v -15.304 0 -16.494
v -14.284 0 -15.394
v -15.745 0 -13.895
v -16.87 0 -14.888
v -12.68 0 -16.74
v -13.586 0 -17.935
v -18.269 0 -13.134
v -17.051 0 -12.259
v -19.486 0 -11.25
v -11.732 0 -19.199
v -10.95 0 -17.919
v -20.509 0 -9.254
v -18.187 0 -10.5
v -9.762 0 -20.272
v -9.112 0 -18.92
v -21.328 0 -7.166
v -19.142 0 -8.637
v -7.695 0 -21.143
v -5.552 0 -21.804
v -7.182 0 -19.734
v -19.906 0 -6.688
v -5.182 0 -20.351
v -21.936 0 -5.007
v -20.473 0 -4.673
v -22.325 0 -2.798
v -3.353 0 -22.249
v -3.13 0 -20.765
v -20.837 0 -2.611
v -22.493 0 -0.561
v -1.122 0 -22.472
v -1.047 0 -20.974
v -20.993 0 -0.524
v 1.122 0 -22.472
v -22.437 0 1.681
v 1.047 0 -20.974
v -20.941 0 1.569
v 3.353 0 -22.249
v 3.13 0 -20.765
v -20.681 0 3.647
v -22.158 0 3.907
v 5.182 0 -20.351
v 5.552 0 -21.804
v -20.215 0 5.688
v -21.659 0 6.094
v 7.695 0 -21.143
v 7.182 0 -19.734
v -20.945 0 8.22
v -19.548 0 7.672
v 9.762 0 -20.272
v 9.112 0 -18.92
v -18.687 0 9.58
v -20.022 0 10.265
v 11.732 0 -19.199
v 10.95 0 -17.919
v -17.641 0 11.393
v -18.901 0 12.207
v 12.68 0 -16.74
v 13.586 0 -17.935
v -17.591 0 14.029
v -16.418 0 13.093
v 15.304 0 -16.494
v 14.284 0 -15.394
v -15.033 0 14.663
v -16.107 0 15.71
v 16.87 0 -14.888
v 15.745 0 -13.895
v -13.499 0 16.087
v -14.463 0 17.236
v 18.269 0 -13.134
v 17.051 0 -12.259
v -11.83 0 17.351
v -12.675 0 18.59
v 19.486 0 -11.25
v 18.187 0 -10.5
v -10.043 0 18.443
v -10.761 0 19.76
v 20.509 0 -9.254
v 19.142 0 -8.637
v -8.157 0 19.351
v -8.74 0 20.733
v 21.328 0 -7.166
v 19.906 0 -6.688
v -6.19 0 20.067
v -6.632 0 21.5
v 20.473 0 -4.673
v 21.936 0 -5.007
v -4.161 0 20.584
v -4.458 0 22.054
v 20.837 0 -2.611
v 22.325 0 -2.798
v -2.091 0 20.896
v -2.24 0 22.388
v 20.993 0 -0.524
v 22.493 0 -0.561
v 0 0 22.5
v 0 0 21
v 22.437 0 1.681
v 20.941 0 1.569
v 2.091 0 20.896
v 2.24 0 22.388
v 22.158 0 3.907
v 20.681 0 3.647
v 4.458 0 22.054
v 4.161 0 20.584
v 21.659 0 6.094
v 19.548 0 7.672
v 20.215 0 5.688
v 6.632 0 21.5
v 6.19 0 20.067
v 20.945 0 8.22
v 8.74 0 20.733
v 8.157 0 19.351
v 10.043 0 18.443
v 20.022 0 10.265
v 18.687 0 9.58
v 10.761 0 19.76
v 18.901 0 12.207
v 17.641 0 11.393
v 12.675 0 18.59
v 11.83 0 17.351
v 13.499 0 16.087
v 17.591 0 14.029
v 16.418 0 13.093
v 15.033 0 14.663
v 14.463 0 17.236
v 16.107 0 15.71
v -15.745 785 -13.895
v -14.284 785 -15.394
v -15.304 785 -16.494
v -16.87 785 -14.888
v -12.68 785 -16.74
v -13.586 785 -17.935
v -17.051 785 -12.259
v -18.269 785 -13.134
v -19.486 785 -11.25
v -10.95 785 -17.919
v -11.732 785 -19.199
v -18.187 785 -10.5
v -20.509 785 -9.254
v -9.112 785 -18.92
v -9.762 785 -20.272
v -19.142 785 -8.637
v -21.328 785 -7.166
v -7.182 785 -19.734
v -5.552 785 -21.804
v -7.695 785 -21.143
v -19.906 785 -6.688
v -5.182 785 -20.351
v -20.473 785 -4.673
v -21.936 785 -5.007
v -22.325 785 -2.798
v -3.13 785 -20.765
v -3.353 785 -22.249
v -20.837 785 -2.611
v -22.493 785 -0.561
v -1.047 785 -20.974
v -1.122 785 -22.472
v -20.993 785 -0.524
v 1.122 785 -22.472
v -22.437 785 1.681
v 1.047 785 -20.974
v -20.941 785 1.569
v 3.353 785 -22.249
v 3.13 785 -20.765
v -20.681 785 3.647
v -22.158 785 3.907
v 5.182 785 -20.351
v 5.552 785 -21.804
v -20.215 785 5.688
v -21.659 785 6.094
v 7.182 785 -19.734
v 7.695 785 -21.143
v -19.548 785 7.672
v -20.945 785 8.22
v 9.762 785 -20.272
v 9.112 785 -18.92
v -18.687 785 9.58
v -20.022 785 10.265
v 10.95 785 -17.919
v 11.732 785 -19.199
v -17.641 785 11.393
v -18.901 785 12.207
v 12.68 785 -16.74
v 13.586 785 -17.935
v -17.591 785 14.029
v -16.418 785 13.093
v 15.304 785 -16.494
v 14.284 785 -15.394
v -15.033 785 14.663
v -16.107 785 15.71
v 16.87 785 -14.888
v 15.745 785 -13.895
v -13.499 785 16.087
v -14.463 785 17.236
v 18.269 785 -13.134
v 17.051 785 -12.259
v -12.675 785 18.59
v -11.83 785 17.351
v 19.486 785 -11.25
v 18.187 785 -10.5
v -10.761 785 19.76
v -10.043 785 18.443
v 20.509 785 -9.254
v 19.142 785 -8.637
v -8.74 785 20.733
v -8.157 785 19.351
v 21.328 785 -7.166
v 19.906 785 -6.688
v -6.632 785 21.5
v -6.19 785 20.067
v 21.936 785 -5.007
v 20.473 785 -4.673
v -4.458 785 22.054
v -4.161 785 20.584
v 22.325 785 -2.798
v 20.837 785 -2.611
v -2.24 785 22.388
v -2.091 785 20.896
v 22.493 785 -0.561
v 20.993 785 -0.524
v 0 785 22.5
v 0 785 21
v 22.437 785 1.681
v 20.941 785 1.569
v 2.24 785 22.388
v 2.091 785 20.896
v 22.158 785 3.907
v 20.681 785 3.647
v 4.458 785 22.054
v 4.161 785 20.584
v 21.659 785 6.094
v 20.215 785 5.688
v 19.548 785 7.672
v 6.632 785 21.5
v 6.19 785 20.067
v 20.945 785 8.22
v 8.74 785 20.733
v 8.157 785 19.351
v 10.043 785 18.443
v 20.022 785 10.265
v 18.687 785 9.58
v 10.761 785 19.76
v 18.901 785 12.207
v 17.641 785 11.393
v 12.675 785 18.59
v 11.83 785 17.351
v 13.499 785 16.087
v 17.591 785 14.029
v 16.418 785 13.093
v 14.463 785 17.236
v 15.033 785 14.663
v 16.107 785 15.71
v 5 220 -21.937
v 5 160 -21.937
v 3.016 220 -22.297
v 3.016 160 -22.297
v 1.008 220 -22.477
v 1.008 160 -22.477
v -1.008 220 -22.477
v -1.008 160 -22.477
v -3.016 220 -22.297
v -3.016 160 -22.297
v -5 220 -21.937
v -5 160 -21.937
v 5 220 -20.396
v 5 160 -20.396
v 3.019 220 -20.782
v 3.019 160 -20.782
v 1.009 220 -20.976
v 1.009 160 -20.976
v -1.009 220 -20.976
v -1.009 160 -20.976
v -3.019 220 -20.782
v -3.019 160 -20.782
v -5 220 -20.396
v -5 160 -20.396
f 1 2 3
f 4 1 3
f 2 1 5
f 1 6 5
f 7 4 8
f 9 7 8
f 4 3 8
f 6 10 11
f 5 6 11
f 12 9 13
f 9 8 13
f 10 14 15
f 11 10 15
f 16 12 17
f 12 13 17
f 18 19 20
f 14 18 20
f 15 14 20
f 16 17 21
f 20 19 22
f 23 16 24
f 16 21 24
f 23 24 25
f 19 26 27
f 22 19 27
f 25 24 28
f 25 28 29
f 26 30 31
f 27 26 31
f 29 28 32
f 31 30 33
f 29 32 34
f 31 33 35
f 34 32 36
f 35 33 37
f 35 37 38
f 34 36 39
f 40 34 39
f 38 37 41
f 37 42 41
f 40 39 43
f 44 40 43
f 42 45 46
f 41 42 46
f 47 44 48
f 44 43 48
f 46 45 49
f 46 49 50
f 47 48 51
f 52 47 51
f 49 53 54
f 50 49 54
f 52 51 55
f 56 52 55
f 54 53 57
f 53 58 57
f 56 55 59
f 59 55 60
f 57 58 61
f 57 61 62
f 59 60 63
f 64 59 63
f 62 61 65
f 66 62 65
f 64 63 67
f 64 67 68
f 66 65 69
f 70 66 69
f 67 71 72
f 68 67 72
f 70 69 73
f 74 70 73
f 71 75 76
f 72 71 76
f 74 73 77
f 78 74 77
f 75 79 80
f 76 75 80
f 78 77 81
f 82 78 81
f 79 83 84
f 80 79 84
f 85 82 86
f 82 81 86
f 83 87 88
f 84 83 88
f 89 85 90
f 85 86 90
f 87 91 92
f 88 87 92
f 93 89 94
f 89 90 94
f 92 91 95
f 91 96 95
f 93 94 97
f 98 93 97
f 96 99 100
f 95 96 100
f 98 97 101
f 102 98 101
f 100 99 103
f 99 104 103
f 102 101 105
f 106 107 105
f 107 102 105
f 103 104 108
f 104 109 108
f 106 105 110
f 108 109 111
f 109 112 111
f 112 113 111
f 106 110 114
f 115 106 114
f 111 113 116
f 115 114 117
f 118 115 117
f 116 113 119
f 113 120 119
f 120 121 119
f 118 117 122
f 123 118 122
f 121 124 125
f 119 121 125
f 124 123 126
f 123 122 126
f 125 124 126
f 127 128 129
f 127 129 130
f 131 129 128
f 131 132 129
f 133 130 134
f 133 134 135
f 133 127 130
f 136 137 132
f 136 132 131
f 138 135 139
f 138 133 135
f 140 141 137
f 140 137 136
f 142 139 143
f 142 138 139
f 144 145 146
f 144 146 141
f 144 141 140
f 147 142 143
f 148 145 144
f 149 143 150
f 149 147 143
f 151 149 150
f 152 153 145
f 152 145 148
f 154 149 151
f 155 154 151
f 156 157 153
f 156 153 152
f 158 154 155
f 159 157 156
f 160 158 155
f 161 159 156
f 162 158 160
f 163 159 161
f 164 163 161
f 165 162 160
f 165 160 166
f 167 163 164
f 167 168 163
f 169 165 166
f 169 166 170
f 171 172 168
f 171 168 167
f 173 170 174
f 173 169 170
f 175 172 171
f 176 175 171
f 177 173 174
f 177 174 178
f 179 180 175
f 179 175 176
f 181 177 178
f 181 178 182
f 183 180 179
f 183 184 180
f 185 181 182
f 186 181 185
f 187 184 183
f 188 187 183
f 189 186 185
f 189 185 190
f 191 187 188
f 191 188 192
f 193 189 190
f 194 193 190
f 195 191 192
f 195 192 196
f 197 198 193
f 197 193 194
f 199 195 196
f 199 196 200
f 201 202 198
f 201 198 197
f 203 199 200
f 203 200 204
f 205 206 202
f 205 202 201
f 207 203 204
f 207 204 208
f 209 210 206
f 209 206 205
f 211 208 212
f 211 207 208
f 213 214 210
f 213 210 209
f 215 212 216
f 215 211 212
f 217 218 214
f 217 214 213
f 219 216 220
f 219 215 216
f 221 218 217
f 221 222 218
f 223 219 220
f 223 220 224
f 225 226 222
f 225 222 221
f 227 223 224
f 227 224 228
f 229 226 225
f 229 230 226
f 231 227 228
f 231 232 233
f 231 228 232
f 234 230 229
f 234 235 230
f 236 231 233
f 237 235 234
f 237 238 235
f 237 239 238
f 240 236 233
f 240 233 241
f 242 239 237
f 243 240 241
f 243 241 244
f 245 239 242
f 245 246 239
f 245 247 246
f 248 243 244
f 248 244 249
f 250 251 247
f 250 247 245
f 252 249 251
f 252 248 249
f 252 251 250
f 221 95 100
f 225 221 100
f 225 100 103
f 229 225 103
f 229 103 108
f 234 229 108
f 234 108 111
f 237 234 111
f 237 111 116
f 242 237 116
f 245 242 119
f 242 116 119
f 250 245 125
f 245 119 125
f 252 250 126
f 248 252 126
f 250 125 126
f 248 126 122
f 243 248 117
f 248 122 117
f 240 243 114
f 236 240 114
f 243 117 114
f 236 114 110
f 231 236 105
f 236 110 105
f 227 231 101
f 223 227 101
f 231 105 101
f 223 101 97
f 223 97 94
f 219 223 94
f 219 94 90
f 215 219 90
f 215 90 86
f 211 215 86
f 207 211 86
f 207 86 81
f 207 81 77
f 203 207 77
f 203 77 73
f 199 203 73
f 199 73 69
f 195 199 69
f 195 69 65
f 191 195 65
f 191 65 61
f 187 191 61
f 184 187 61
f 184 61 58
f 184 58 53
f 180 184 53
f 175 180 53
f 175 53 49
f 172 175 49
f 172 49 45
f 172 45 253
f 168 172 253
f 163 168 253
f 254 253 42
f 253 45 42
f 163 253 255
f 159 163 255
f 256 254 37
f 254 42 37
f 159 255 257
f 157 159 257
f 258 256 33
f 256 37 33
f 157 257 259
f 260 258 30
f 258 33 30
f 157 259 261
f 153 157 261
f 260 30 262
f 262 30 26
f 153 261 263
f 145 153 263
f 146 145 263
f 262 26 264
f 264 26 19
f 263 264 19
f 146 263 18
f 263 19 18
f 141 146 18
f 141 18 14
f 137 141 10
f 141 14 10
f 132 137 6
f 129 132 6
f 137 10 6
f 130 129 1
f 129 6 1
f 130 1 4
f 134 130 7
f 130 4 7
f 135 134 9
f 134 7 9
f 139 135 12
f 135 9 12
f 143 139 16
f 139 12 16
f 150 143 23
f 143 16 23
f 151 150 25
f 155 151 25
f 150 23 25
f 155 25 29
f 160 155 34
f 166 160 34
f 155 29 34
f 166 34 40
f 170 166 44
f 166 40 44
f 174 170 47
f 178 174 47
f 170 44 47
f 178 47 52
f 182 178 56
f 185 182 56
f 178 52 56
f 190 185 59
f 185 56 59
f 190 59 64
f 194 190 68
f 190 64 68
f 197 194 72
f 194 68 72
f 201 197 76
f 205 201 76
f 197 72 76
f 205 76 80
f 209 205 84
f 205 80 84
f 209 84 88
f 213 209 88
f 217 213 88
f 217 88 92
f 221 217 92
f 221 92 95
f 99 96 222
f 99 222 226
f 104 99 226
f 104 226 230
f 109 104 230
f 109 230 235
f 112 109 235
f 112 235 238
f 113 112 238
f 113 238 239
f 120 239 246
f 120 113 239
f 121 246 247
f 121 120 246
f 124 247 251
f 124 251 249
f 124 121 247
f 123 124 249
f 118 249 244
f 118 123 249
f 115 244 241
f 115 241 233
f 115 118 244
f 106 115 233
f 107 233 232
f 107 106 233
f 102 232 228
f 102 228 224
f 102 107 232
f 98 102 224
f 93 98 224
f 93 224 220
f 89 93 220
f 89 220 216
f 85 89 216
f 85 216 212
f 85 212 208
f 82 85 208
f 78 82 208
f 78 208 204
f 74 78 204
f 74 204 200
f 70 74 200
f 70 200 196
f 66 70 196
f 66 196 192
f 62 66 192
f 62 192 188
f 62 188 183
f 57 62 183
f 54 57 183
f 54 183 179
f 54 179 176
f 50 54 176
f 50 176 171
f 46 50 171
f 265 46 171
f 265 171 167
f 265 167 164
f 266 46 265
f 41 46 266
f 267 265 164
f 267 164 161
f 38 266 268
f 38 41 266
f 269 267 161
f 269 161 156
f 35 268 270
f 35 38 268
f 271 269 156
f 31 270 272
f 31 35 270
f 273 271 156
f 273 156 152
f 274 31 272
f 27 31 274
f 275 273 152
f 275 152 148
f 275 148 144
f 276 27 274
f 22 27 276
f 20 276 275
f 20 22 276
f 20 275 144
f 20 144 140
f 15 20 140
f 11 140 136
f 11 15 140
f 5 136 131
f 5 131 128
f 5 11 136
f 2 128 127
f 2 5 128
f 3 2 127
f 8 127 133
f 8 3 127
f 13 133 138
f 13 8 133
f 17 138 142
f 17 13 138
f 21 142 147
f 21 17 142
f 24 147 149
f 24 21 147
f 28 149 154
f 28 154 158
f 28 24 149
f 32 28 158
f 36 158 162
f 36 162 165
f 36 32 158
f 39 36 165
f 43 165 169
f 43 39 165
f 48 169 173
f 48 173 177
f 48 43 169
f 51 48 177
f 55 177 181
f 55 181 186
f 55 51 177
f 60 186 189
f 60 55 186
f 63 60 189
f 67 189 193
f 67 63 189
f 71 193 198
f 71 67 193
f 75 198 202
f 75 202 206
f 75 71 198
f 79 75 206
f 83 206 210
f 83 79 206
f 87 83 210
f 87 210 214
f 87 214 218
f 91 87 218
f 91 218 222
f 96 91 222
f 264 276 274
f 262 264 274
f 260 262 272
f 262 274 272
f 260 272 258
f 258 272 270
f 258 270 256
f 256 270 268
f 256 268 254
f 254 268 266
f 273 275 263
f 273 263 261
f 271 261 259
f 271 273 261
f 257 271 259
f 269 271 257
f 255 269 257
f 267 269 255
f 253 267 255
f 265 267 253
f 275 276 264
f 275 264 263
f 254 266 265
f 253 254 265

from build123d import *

# Parameters (mm, degrees)
CROQUIS1_R              = 22.5
CROQUIS1_R_2            = 21
SALIENTE_EXTRUIR1_DEPTH = 785
CROQUIS2_W              = 10
CROQUIS2_H              = 60
CORTAR_EXTRUIR1_DEPTH   = 785


with BuildPart() as part:
    # Croquis1 → Saliente-Extruir1 (new body)
    with BuildSketch(Plane(origin=(0, 0, 0), x_dir=(1, 0, 0), z_dir=(0, 1, 0))):
        with Locations(Location((0, 0, 0), (0, 0, 270))):
            Circle(CROQUIS1_R)
        with Locations(Location((0, 0, 0), (0, 0, 270))):
            Circle(CROQUIS1_R_2, mode=Mode.SUBTRACT)
    extrude(amount=SALIENTE_EXTRUIR1_DEPTH)

    # Croquis2 → Cortar-Extruir1 (cut)
    with BuildSketch(Plane.XY):
        with Locations((0, 190)):
            Rectangle(CROQUIS2_W, CROQUIS2_H)
    extrude(amount=-CORTAR_EXTRUIR1_DEPTH, mode=Mode.SUBTRACT)


solid = part.part
